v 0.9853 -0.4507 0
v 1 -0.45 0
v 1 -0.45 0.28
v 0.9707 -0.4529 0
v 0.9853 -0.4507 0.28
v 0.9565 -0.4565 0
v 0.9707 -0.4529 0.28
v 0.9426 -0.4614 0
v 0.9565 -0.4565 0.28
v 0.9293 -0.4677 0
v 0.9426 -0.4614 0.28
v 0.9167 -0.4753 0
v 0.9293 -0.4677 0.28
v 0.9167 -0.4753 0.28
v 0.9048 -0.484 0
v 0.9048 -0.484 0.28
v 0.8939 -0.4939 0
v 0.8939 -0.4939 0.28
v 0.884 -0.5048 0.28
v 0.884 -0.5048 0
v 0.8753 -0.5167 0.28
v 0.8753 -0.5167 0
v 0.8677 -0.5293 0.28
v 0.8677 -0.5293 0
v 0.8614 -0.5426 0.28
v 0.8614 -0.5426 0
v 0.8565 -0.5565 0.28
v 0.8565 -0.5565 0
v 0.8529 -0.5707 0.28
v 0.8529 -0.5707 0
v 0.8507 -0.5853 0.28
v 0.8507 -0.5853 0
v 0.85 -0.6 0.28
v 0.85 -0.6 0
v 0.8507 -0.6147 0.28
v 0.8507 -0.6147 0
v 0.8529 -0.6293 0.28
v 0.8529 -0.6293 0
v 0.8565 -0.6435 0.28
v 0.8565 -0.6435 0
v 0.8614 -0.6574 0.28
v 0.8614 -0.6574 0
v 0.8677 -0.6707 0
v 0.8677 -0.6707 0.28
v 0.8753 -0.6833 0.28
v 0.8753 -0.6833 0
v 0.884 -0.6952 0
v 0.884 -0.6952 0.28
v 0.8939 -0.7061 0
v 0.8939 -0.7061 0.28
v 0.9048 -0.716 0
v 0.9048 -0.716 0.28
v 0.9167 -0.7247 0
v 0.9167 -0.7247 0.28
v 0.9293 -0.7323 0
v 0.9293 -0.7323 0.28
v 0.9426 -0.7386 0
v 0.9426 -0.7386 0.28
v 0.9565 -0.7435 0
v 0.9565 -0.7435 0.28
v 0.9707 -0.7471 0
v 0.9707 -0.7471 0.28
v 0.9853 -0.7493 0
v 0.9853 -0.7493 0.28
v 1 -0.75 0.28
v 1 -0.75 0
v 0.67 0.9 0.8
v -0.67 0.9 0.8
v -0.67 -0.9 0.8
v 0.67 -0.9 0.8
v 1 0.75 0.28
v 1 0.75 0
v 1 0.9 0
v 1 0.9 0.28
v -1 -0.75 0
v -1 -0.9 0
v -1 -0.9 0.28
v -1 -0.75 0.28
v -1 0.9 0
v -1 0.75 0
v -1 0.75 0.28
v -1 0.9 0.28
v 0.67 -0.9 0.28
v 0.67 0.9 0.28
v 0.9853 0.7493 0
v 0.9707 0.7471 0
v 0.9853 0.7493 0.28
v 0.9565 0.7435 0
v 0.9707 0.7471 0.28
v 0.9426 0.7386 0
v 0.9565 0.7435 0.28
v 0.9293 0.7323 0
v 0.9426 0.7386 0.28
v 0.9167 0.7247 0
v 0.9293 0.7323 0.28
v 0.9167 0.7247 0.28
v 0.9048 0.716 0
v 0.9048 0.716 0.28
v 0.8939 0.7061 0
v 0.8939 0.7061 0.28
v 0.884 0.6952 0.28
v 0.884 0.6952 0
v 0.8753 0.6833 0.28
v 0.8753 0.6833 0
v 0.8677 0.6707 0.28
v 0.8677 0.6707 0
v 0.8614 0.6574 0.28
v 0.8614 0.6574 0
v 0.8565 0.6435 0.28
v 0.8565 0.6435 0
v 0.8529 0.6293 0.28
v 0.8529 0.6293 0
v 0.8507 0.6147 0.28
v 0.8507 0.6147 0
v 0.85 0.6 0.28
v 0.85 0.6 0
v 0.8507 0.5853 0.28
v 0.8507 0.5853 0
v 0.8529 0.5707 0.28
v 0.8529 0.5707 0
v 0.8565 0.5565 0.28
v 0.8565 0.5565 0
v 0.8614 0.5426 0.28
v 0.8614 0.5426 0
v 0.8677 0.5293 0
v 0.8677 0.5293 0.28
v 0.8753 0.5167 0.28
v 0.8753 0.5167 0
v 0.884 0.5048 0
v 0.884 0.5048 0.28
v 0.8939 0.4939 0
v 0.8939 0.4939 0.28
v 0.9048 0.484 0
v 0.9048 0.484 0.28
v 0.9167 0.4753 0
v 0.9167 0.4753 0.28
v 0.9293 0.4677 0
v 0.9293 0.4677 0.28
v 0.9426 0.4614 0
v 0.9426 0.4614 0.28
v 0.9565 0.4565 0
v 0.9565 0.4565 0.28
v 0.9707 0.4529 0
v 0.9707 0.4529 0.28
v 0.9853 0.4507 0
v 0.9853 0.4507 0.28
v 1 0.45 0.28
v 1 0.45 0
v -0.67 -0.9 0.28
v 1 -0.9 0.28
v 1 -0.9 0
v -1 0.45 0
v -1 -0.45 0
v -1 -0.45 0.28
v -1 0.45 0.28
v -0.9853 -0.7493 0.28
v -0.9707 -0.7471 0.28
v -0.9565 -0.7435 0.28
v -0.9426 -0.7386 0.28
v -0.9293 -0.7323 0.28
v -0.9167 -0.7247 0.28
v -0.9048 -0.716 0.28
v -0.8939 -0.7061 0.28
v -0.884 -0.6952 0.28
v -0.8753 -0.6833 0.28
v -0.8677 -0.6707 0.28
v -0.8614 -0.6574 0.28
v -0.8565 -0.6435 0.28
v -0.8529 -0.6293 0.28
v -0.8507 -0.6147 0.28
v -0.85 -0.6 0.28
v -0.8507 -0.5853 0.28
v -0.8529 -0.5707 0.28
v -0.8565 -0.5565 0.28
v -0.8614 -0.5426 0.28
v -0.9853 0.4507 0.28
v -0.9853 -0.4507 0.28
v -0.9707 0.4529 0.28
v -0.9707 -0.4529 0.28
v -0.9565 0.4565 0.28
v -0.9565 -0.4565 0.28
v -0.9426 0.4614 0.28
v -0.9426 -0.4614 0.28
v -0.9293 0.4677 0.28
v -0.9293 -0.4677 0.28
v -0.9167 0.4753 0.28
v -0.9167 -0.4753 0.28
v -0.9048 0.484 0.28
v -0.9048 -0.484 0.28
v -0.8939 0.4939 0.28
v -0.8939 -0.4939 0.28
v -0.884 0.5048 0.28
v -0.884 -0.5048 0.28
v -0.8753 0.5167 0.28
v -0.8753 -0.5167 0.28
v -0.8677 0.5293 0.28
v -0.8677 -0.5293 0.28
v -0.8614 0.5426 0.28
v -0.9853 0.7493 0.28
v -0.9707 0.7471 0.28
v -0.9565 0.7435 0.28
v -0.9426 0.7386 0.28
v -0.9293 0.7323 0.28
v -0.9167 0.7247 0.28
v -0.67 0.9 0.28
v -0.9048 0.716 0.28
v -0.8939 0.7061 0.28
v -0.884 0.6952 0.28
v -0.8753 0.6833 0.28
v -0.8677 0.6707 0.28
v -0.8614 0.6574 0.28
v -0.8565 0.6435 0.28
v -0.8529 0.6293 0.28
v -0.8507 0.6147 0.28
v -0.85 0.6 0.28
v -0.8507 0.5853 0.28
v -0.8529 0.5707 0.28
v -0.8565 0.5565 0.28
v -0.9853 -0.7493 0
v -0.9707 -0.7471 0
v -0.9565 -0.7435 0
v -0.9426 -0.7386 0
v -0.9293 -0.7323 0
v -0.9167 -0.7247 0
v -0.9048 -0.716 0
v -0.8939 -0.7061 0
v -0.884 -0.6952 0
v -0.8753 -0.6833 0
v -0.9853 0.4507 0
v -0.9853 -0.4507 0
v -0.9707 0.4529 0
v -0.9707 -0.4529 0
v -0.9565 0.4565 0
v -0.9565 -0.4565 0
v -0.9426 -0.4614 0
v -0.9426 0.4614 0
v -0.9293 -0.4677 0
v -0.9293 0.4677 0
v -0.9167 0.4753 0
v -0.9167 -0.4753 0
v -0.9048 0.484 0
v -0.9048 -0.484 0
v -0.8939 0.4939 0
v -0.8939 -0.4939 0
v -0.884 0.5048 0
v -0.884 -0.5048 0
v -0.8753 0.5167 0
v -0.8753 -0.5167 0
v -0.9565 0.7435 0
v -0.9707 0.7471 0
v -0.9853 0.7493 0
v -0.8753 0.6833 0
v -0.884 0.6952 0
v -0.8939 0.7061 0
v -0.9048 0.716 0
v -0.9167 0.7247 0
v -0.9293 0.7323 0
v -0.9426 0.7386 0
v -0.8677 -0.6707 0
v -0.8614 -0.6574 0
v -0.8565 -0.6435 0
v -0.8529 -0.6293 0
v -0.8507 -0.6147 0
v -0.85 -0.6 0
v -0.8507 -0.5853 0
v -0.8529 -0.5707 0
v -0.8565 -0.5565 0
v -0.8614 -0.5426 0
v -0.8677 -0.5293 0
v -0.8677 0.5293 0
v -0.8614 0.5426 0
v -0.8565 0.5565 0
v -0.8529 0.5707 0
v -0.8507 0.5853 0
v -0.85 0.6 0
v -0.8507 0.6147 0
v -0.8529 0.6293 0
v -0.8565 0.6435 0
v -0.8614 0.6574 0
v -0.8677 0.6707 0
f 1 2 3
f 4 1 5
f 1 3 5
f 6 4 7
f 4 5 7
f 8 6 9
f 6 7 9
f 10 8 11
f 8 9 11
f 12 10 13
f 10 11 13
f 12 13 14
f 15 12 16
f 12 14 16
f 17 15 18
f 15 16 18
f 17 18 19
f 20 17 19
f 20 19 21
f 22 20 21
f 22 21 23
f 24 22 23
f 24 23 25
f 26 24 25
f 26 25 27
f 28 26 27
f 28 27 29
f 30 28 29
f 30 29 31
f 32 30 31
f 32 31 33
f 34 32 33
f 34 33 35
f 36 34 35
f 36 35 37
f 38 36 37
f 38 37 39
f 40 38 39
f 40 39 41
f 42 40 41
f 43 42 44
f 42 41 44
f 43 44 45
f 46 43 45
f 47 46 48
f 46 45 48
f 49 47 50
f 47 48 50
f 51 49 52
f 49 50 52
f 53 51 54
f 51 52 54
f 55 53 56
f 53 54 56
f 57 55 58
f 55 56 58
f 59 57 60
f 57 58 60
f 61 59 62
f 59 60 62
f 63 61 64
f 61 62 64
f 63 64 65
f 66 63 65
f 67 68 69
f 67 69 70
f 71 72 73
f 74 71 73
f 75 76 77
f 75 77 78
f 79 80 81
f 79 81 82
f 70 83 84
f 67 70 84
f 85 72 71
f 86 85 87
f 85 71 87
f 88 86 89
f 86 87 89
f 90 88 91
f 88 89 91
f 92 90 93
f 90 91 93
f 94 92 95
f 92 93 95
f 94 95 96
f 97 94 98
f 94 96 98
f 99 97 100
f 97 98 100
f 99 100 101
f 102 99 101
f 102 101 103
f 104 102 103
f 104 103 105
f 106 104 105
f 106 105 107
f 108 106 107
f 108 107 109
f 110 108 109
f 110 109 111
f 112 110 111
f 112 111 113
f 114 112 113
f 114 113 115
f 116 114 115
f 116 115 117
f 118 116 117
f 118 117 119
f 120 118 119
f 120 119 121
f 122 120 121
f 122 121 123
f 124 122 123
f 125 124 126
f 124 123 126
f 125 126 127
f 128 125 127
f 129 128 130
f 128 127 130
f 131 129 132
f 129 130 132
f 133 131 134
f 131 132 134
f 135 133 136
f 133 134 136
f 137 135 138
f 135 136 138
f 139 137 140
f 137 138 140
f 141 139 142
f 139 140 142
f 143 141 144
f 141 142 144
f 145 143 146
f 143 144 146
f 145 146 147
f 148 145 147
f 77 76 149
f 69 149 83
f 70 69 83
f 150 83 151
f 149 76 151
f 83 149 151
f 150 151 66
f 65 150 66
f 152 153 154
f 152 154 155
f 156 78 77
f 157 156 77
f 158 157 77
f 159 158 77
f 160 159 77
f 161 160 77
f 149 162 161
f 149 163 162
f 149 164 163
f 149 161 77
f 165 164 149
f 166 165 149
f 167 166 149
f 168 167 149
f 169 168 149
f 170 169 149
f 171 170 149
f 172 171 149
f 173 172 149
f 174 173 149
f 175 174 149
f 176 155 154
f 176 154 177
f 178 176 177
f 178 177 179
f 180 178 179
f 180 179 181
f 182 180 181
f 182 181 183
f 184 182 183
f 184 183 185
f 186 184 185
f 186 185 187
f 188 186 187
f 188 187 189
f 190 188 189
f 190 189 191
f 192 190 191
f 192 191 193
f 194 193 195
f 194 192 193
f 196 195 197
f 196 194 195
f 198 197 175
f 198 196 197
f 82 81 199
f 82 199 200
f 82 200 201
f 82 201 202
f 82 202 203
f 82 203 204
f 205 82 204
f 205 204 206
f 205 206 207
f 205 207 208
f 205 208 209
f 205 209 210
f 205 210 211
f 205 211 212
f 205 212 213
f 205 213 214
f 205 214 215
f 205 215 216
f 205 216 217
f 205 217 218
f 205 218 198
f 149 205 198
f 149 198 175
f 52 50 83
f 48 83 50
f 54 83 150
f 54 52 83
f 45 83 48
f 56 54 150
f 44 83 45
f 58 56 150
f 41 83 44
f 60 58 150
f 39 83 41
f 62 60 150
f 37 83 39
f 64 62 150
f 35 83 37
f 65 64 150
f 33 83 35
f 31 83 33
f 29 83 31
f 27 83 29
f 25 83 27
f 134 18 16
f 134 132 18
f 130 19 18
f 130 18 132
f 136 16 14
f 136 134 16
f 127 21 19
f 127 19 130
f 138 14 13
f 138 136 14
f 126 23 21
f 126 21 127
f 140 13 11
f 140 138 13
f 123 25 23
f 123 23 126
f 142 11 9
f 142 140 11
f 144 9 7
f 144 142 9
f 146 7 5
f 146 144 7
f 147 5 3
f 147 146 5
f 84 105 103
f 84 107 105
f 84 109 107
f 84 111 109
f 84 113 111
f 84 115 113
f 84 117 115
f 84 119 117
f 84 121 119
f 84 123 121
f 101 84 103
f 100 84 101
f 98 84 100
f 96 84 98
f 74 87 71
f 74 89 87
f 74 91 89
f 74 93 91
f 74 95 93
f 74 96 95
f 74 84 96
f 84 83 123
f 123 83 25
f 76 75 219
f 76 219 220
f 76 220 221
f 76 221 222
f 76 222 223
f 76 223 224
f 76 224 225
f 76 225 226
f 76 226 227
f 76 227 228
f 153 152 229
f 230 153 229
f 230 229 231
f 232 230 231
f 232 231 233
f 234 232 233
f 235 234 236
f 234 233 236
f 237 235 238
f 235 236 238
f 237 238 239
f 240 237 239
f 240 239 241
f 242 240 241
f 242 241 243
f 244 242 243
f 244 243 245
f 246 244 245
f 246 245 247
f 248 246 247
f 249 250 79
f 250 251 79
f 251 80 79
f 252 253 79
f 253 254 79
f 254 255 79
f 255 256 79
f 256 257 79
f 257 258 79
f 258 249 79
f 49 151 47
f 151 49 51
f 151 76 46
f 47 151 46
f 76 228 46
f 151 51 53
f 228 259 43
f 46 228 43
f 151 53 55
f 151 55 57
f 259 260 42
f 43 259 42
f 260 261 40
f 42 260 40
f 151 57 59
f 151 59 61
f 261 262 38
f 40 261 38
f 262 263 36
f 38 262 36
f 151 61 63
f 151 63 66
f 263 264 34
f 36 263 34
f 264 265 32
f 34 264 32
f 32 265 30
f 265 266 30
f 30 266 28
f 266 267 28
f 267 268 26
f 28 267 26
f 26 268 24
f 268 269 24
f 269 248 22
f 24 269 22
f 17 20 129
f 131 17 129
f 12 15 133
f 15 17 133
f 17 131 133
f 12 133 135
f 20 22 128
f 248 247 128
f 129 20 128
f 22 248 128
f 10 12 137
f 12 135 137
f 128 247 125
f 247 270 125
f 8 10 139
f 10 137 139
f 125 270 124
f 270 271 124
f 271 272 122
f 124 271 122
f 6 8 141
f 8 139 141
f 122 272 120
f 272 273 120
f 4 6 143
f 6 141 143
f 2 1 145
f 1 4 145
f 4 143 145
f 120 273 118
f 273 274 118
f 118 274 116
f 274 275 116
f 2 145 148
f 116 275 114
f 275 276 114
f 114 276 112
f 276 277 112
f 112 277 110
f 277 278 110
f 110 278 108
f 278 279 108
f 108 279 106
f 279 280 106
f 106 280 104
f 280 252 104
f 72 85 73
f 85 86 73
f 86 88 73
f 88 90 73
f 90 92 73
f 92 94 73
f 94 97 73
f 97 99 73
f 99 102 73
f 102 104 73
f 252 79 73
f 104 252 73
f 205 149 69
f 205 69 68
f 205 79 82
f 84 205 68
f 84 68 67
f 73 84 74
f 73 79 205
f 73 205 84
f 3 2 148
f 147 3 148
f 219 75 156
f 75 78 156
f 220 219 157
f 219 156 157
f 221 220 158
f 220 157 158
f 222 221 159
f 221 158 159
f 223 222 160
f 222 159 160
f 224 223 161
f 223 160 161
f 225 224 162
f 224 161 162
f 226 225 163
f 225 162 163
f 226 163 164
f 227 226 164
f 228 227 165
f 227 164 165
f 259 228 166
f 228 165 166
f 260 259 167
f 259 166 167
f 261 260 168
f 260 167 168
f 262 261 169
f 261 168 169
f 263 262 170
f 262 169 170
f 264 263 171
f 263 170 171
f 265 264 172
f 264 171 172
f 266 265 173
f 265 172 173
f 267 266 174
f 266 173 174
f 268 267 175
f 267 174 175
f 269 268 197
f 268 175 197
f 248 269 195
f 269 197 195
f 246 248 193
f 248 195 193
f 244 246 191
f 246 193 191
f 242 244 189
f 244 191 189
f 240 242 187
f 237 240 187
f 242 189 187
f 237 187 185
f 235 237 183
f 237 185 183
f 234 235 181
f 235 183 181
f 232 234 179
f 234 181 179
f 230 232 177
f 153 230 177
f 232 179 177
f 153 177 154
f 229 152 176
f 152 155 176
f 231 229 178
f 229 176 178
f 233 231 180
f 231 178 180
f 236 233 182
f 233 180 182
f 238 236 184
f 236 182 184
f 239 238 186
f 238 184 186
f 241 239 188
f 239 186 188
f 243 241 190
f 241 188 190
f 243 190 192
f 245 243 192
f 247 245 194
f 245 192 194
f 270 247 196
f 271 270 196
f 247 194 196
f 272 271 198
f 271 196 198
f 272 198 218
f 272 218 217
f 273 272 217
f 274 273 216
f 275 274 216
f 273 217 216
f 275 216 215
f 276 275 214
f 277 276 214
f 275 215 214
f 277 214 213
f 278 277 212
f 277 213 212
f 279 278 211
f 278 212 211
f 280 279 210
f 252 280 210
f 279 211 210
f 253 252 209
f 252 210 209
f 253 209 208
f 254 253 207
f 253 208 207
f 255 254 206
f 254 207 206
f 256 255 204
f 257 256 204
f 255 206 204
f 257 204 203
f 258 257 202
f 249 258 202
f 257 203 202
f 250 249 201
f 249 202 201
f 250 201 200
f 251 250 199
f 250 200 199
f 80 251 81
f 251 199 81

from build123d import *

# Parameters (mm, degrees)
SKETCH_W     = 2
SKETCH_H     = 1.8
PAD_DEPTH    = 0.28
SKETCH001_W  = 1.34
SKETCH001_H  = 1.8
PAD001_DEPTH = 0.52
SKETCH002_R  = 0.15
POCKET_DEPTH = 1


with BuildPart() as part:
    # Sketch → Pad (new body)
    with BuildSketch(Plane.XY):
        Rectangle(SKETCH_W, SKETCH_H)
    extrude(amount=PAD_DEPTH)

    # Sketch001 (on Face6 of Pad) → Pad001 (join)
    with BuildSketch(Plane.XY.offset(0.28)):
        Rectangle(SKETCH001_W, SKETCH001_H)
    extrude(amount=PAD001_DEPTH)

    # Sketch002 (on Face5 of Pad001) → Pocket (cut)
    with BuildSketch(Plane.XY.offset(0.28)):
        with Locations((1, 0.6)):
            Circle(SKETCH002_R)
        with Locations((1, -0.6)):
            Circle(SKETCH002_R)
        with Locations((-1, 0.6)):
            Circle(SKETCH002_R)
        with Locations((-1, -0.6)):
            Circle(SKETCH002_R)
    extrude(amount=-POCKET_DEPTH, mode=Mode.SUBTRACT)


solid = part.part
